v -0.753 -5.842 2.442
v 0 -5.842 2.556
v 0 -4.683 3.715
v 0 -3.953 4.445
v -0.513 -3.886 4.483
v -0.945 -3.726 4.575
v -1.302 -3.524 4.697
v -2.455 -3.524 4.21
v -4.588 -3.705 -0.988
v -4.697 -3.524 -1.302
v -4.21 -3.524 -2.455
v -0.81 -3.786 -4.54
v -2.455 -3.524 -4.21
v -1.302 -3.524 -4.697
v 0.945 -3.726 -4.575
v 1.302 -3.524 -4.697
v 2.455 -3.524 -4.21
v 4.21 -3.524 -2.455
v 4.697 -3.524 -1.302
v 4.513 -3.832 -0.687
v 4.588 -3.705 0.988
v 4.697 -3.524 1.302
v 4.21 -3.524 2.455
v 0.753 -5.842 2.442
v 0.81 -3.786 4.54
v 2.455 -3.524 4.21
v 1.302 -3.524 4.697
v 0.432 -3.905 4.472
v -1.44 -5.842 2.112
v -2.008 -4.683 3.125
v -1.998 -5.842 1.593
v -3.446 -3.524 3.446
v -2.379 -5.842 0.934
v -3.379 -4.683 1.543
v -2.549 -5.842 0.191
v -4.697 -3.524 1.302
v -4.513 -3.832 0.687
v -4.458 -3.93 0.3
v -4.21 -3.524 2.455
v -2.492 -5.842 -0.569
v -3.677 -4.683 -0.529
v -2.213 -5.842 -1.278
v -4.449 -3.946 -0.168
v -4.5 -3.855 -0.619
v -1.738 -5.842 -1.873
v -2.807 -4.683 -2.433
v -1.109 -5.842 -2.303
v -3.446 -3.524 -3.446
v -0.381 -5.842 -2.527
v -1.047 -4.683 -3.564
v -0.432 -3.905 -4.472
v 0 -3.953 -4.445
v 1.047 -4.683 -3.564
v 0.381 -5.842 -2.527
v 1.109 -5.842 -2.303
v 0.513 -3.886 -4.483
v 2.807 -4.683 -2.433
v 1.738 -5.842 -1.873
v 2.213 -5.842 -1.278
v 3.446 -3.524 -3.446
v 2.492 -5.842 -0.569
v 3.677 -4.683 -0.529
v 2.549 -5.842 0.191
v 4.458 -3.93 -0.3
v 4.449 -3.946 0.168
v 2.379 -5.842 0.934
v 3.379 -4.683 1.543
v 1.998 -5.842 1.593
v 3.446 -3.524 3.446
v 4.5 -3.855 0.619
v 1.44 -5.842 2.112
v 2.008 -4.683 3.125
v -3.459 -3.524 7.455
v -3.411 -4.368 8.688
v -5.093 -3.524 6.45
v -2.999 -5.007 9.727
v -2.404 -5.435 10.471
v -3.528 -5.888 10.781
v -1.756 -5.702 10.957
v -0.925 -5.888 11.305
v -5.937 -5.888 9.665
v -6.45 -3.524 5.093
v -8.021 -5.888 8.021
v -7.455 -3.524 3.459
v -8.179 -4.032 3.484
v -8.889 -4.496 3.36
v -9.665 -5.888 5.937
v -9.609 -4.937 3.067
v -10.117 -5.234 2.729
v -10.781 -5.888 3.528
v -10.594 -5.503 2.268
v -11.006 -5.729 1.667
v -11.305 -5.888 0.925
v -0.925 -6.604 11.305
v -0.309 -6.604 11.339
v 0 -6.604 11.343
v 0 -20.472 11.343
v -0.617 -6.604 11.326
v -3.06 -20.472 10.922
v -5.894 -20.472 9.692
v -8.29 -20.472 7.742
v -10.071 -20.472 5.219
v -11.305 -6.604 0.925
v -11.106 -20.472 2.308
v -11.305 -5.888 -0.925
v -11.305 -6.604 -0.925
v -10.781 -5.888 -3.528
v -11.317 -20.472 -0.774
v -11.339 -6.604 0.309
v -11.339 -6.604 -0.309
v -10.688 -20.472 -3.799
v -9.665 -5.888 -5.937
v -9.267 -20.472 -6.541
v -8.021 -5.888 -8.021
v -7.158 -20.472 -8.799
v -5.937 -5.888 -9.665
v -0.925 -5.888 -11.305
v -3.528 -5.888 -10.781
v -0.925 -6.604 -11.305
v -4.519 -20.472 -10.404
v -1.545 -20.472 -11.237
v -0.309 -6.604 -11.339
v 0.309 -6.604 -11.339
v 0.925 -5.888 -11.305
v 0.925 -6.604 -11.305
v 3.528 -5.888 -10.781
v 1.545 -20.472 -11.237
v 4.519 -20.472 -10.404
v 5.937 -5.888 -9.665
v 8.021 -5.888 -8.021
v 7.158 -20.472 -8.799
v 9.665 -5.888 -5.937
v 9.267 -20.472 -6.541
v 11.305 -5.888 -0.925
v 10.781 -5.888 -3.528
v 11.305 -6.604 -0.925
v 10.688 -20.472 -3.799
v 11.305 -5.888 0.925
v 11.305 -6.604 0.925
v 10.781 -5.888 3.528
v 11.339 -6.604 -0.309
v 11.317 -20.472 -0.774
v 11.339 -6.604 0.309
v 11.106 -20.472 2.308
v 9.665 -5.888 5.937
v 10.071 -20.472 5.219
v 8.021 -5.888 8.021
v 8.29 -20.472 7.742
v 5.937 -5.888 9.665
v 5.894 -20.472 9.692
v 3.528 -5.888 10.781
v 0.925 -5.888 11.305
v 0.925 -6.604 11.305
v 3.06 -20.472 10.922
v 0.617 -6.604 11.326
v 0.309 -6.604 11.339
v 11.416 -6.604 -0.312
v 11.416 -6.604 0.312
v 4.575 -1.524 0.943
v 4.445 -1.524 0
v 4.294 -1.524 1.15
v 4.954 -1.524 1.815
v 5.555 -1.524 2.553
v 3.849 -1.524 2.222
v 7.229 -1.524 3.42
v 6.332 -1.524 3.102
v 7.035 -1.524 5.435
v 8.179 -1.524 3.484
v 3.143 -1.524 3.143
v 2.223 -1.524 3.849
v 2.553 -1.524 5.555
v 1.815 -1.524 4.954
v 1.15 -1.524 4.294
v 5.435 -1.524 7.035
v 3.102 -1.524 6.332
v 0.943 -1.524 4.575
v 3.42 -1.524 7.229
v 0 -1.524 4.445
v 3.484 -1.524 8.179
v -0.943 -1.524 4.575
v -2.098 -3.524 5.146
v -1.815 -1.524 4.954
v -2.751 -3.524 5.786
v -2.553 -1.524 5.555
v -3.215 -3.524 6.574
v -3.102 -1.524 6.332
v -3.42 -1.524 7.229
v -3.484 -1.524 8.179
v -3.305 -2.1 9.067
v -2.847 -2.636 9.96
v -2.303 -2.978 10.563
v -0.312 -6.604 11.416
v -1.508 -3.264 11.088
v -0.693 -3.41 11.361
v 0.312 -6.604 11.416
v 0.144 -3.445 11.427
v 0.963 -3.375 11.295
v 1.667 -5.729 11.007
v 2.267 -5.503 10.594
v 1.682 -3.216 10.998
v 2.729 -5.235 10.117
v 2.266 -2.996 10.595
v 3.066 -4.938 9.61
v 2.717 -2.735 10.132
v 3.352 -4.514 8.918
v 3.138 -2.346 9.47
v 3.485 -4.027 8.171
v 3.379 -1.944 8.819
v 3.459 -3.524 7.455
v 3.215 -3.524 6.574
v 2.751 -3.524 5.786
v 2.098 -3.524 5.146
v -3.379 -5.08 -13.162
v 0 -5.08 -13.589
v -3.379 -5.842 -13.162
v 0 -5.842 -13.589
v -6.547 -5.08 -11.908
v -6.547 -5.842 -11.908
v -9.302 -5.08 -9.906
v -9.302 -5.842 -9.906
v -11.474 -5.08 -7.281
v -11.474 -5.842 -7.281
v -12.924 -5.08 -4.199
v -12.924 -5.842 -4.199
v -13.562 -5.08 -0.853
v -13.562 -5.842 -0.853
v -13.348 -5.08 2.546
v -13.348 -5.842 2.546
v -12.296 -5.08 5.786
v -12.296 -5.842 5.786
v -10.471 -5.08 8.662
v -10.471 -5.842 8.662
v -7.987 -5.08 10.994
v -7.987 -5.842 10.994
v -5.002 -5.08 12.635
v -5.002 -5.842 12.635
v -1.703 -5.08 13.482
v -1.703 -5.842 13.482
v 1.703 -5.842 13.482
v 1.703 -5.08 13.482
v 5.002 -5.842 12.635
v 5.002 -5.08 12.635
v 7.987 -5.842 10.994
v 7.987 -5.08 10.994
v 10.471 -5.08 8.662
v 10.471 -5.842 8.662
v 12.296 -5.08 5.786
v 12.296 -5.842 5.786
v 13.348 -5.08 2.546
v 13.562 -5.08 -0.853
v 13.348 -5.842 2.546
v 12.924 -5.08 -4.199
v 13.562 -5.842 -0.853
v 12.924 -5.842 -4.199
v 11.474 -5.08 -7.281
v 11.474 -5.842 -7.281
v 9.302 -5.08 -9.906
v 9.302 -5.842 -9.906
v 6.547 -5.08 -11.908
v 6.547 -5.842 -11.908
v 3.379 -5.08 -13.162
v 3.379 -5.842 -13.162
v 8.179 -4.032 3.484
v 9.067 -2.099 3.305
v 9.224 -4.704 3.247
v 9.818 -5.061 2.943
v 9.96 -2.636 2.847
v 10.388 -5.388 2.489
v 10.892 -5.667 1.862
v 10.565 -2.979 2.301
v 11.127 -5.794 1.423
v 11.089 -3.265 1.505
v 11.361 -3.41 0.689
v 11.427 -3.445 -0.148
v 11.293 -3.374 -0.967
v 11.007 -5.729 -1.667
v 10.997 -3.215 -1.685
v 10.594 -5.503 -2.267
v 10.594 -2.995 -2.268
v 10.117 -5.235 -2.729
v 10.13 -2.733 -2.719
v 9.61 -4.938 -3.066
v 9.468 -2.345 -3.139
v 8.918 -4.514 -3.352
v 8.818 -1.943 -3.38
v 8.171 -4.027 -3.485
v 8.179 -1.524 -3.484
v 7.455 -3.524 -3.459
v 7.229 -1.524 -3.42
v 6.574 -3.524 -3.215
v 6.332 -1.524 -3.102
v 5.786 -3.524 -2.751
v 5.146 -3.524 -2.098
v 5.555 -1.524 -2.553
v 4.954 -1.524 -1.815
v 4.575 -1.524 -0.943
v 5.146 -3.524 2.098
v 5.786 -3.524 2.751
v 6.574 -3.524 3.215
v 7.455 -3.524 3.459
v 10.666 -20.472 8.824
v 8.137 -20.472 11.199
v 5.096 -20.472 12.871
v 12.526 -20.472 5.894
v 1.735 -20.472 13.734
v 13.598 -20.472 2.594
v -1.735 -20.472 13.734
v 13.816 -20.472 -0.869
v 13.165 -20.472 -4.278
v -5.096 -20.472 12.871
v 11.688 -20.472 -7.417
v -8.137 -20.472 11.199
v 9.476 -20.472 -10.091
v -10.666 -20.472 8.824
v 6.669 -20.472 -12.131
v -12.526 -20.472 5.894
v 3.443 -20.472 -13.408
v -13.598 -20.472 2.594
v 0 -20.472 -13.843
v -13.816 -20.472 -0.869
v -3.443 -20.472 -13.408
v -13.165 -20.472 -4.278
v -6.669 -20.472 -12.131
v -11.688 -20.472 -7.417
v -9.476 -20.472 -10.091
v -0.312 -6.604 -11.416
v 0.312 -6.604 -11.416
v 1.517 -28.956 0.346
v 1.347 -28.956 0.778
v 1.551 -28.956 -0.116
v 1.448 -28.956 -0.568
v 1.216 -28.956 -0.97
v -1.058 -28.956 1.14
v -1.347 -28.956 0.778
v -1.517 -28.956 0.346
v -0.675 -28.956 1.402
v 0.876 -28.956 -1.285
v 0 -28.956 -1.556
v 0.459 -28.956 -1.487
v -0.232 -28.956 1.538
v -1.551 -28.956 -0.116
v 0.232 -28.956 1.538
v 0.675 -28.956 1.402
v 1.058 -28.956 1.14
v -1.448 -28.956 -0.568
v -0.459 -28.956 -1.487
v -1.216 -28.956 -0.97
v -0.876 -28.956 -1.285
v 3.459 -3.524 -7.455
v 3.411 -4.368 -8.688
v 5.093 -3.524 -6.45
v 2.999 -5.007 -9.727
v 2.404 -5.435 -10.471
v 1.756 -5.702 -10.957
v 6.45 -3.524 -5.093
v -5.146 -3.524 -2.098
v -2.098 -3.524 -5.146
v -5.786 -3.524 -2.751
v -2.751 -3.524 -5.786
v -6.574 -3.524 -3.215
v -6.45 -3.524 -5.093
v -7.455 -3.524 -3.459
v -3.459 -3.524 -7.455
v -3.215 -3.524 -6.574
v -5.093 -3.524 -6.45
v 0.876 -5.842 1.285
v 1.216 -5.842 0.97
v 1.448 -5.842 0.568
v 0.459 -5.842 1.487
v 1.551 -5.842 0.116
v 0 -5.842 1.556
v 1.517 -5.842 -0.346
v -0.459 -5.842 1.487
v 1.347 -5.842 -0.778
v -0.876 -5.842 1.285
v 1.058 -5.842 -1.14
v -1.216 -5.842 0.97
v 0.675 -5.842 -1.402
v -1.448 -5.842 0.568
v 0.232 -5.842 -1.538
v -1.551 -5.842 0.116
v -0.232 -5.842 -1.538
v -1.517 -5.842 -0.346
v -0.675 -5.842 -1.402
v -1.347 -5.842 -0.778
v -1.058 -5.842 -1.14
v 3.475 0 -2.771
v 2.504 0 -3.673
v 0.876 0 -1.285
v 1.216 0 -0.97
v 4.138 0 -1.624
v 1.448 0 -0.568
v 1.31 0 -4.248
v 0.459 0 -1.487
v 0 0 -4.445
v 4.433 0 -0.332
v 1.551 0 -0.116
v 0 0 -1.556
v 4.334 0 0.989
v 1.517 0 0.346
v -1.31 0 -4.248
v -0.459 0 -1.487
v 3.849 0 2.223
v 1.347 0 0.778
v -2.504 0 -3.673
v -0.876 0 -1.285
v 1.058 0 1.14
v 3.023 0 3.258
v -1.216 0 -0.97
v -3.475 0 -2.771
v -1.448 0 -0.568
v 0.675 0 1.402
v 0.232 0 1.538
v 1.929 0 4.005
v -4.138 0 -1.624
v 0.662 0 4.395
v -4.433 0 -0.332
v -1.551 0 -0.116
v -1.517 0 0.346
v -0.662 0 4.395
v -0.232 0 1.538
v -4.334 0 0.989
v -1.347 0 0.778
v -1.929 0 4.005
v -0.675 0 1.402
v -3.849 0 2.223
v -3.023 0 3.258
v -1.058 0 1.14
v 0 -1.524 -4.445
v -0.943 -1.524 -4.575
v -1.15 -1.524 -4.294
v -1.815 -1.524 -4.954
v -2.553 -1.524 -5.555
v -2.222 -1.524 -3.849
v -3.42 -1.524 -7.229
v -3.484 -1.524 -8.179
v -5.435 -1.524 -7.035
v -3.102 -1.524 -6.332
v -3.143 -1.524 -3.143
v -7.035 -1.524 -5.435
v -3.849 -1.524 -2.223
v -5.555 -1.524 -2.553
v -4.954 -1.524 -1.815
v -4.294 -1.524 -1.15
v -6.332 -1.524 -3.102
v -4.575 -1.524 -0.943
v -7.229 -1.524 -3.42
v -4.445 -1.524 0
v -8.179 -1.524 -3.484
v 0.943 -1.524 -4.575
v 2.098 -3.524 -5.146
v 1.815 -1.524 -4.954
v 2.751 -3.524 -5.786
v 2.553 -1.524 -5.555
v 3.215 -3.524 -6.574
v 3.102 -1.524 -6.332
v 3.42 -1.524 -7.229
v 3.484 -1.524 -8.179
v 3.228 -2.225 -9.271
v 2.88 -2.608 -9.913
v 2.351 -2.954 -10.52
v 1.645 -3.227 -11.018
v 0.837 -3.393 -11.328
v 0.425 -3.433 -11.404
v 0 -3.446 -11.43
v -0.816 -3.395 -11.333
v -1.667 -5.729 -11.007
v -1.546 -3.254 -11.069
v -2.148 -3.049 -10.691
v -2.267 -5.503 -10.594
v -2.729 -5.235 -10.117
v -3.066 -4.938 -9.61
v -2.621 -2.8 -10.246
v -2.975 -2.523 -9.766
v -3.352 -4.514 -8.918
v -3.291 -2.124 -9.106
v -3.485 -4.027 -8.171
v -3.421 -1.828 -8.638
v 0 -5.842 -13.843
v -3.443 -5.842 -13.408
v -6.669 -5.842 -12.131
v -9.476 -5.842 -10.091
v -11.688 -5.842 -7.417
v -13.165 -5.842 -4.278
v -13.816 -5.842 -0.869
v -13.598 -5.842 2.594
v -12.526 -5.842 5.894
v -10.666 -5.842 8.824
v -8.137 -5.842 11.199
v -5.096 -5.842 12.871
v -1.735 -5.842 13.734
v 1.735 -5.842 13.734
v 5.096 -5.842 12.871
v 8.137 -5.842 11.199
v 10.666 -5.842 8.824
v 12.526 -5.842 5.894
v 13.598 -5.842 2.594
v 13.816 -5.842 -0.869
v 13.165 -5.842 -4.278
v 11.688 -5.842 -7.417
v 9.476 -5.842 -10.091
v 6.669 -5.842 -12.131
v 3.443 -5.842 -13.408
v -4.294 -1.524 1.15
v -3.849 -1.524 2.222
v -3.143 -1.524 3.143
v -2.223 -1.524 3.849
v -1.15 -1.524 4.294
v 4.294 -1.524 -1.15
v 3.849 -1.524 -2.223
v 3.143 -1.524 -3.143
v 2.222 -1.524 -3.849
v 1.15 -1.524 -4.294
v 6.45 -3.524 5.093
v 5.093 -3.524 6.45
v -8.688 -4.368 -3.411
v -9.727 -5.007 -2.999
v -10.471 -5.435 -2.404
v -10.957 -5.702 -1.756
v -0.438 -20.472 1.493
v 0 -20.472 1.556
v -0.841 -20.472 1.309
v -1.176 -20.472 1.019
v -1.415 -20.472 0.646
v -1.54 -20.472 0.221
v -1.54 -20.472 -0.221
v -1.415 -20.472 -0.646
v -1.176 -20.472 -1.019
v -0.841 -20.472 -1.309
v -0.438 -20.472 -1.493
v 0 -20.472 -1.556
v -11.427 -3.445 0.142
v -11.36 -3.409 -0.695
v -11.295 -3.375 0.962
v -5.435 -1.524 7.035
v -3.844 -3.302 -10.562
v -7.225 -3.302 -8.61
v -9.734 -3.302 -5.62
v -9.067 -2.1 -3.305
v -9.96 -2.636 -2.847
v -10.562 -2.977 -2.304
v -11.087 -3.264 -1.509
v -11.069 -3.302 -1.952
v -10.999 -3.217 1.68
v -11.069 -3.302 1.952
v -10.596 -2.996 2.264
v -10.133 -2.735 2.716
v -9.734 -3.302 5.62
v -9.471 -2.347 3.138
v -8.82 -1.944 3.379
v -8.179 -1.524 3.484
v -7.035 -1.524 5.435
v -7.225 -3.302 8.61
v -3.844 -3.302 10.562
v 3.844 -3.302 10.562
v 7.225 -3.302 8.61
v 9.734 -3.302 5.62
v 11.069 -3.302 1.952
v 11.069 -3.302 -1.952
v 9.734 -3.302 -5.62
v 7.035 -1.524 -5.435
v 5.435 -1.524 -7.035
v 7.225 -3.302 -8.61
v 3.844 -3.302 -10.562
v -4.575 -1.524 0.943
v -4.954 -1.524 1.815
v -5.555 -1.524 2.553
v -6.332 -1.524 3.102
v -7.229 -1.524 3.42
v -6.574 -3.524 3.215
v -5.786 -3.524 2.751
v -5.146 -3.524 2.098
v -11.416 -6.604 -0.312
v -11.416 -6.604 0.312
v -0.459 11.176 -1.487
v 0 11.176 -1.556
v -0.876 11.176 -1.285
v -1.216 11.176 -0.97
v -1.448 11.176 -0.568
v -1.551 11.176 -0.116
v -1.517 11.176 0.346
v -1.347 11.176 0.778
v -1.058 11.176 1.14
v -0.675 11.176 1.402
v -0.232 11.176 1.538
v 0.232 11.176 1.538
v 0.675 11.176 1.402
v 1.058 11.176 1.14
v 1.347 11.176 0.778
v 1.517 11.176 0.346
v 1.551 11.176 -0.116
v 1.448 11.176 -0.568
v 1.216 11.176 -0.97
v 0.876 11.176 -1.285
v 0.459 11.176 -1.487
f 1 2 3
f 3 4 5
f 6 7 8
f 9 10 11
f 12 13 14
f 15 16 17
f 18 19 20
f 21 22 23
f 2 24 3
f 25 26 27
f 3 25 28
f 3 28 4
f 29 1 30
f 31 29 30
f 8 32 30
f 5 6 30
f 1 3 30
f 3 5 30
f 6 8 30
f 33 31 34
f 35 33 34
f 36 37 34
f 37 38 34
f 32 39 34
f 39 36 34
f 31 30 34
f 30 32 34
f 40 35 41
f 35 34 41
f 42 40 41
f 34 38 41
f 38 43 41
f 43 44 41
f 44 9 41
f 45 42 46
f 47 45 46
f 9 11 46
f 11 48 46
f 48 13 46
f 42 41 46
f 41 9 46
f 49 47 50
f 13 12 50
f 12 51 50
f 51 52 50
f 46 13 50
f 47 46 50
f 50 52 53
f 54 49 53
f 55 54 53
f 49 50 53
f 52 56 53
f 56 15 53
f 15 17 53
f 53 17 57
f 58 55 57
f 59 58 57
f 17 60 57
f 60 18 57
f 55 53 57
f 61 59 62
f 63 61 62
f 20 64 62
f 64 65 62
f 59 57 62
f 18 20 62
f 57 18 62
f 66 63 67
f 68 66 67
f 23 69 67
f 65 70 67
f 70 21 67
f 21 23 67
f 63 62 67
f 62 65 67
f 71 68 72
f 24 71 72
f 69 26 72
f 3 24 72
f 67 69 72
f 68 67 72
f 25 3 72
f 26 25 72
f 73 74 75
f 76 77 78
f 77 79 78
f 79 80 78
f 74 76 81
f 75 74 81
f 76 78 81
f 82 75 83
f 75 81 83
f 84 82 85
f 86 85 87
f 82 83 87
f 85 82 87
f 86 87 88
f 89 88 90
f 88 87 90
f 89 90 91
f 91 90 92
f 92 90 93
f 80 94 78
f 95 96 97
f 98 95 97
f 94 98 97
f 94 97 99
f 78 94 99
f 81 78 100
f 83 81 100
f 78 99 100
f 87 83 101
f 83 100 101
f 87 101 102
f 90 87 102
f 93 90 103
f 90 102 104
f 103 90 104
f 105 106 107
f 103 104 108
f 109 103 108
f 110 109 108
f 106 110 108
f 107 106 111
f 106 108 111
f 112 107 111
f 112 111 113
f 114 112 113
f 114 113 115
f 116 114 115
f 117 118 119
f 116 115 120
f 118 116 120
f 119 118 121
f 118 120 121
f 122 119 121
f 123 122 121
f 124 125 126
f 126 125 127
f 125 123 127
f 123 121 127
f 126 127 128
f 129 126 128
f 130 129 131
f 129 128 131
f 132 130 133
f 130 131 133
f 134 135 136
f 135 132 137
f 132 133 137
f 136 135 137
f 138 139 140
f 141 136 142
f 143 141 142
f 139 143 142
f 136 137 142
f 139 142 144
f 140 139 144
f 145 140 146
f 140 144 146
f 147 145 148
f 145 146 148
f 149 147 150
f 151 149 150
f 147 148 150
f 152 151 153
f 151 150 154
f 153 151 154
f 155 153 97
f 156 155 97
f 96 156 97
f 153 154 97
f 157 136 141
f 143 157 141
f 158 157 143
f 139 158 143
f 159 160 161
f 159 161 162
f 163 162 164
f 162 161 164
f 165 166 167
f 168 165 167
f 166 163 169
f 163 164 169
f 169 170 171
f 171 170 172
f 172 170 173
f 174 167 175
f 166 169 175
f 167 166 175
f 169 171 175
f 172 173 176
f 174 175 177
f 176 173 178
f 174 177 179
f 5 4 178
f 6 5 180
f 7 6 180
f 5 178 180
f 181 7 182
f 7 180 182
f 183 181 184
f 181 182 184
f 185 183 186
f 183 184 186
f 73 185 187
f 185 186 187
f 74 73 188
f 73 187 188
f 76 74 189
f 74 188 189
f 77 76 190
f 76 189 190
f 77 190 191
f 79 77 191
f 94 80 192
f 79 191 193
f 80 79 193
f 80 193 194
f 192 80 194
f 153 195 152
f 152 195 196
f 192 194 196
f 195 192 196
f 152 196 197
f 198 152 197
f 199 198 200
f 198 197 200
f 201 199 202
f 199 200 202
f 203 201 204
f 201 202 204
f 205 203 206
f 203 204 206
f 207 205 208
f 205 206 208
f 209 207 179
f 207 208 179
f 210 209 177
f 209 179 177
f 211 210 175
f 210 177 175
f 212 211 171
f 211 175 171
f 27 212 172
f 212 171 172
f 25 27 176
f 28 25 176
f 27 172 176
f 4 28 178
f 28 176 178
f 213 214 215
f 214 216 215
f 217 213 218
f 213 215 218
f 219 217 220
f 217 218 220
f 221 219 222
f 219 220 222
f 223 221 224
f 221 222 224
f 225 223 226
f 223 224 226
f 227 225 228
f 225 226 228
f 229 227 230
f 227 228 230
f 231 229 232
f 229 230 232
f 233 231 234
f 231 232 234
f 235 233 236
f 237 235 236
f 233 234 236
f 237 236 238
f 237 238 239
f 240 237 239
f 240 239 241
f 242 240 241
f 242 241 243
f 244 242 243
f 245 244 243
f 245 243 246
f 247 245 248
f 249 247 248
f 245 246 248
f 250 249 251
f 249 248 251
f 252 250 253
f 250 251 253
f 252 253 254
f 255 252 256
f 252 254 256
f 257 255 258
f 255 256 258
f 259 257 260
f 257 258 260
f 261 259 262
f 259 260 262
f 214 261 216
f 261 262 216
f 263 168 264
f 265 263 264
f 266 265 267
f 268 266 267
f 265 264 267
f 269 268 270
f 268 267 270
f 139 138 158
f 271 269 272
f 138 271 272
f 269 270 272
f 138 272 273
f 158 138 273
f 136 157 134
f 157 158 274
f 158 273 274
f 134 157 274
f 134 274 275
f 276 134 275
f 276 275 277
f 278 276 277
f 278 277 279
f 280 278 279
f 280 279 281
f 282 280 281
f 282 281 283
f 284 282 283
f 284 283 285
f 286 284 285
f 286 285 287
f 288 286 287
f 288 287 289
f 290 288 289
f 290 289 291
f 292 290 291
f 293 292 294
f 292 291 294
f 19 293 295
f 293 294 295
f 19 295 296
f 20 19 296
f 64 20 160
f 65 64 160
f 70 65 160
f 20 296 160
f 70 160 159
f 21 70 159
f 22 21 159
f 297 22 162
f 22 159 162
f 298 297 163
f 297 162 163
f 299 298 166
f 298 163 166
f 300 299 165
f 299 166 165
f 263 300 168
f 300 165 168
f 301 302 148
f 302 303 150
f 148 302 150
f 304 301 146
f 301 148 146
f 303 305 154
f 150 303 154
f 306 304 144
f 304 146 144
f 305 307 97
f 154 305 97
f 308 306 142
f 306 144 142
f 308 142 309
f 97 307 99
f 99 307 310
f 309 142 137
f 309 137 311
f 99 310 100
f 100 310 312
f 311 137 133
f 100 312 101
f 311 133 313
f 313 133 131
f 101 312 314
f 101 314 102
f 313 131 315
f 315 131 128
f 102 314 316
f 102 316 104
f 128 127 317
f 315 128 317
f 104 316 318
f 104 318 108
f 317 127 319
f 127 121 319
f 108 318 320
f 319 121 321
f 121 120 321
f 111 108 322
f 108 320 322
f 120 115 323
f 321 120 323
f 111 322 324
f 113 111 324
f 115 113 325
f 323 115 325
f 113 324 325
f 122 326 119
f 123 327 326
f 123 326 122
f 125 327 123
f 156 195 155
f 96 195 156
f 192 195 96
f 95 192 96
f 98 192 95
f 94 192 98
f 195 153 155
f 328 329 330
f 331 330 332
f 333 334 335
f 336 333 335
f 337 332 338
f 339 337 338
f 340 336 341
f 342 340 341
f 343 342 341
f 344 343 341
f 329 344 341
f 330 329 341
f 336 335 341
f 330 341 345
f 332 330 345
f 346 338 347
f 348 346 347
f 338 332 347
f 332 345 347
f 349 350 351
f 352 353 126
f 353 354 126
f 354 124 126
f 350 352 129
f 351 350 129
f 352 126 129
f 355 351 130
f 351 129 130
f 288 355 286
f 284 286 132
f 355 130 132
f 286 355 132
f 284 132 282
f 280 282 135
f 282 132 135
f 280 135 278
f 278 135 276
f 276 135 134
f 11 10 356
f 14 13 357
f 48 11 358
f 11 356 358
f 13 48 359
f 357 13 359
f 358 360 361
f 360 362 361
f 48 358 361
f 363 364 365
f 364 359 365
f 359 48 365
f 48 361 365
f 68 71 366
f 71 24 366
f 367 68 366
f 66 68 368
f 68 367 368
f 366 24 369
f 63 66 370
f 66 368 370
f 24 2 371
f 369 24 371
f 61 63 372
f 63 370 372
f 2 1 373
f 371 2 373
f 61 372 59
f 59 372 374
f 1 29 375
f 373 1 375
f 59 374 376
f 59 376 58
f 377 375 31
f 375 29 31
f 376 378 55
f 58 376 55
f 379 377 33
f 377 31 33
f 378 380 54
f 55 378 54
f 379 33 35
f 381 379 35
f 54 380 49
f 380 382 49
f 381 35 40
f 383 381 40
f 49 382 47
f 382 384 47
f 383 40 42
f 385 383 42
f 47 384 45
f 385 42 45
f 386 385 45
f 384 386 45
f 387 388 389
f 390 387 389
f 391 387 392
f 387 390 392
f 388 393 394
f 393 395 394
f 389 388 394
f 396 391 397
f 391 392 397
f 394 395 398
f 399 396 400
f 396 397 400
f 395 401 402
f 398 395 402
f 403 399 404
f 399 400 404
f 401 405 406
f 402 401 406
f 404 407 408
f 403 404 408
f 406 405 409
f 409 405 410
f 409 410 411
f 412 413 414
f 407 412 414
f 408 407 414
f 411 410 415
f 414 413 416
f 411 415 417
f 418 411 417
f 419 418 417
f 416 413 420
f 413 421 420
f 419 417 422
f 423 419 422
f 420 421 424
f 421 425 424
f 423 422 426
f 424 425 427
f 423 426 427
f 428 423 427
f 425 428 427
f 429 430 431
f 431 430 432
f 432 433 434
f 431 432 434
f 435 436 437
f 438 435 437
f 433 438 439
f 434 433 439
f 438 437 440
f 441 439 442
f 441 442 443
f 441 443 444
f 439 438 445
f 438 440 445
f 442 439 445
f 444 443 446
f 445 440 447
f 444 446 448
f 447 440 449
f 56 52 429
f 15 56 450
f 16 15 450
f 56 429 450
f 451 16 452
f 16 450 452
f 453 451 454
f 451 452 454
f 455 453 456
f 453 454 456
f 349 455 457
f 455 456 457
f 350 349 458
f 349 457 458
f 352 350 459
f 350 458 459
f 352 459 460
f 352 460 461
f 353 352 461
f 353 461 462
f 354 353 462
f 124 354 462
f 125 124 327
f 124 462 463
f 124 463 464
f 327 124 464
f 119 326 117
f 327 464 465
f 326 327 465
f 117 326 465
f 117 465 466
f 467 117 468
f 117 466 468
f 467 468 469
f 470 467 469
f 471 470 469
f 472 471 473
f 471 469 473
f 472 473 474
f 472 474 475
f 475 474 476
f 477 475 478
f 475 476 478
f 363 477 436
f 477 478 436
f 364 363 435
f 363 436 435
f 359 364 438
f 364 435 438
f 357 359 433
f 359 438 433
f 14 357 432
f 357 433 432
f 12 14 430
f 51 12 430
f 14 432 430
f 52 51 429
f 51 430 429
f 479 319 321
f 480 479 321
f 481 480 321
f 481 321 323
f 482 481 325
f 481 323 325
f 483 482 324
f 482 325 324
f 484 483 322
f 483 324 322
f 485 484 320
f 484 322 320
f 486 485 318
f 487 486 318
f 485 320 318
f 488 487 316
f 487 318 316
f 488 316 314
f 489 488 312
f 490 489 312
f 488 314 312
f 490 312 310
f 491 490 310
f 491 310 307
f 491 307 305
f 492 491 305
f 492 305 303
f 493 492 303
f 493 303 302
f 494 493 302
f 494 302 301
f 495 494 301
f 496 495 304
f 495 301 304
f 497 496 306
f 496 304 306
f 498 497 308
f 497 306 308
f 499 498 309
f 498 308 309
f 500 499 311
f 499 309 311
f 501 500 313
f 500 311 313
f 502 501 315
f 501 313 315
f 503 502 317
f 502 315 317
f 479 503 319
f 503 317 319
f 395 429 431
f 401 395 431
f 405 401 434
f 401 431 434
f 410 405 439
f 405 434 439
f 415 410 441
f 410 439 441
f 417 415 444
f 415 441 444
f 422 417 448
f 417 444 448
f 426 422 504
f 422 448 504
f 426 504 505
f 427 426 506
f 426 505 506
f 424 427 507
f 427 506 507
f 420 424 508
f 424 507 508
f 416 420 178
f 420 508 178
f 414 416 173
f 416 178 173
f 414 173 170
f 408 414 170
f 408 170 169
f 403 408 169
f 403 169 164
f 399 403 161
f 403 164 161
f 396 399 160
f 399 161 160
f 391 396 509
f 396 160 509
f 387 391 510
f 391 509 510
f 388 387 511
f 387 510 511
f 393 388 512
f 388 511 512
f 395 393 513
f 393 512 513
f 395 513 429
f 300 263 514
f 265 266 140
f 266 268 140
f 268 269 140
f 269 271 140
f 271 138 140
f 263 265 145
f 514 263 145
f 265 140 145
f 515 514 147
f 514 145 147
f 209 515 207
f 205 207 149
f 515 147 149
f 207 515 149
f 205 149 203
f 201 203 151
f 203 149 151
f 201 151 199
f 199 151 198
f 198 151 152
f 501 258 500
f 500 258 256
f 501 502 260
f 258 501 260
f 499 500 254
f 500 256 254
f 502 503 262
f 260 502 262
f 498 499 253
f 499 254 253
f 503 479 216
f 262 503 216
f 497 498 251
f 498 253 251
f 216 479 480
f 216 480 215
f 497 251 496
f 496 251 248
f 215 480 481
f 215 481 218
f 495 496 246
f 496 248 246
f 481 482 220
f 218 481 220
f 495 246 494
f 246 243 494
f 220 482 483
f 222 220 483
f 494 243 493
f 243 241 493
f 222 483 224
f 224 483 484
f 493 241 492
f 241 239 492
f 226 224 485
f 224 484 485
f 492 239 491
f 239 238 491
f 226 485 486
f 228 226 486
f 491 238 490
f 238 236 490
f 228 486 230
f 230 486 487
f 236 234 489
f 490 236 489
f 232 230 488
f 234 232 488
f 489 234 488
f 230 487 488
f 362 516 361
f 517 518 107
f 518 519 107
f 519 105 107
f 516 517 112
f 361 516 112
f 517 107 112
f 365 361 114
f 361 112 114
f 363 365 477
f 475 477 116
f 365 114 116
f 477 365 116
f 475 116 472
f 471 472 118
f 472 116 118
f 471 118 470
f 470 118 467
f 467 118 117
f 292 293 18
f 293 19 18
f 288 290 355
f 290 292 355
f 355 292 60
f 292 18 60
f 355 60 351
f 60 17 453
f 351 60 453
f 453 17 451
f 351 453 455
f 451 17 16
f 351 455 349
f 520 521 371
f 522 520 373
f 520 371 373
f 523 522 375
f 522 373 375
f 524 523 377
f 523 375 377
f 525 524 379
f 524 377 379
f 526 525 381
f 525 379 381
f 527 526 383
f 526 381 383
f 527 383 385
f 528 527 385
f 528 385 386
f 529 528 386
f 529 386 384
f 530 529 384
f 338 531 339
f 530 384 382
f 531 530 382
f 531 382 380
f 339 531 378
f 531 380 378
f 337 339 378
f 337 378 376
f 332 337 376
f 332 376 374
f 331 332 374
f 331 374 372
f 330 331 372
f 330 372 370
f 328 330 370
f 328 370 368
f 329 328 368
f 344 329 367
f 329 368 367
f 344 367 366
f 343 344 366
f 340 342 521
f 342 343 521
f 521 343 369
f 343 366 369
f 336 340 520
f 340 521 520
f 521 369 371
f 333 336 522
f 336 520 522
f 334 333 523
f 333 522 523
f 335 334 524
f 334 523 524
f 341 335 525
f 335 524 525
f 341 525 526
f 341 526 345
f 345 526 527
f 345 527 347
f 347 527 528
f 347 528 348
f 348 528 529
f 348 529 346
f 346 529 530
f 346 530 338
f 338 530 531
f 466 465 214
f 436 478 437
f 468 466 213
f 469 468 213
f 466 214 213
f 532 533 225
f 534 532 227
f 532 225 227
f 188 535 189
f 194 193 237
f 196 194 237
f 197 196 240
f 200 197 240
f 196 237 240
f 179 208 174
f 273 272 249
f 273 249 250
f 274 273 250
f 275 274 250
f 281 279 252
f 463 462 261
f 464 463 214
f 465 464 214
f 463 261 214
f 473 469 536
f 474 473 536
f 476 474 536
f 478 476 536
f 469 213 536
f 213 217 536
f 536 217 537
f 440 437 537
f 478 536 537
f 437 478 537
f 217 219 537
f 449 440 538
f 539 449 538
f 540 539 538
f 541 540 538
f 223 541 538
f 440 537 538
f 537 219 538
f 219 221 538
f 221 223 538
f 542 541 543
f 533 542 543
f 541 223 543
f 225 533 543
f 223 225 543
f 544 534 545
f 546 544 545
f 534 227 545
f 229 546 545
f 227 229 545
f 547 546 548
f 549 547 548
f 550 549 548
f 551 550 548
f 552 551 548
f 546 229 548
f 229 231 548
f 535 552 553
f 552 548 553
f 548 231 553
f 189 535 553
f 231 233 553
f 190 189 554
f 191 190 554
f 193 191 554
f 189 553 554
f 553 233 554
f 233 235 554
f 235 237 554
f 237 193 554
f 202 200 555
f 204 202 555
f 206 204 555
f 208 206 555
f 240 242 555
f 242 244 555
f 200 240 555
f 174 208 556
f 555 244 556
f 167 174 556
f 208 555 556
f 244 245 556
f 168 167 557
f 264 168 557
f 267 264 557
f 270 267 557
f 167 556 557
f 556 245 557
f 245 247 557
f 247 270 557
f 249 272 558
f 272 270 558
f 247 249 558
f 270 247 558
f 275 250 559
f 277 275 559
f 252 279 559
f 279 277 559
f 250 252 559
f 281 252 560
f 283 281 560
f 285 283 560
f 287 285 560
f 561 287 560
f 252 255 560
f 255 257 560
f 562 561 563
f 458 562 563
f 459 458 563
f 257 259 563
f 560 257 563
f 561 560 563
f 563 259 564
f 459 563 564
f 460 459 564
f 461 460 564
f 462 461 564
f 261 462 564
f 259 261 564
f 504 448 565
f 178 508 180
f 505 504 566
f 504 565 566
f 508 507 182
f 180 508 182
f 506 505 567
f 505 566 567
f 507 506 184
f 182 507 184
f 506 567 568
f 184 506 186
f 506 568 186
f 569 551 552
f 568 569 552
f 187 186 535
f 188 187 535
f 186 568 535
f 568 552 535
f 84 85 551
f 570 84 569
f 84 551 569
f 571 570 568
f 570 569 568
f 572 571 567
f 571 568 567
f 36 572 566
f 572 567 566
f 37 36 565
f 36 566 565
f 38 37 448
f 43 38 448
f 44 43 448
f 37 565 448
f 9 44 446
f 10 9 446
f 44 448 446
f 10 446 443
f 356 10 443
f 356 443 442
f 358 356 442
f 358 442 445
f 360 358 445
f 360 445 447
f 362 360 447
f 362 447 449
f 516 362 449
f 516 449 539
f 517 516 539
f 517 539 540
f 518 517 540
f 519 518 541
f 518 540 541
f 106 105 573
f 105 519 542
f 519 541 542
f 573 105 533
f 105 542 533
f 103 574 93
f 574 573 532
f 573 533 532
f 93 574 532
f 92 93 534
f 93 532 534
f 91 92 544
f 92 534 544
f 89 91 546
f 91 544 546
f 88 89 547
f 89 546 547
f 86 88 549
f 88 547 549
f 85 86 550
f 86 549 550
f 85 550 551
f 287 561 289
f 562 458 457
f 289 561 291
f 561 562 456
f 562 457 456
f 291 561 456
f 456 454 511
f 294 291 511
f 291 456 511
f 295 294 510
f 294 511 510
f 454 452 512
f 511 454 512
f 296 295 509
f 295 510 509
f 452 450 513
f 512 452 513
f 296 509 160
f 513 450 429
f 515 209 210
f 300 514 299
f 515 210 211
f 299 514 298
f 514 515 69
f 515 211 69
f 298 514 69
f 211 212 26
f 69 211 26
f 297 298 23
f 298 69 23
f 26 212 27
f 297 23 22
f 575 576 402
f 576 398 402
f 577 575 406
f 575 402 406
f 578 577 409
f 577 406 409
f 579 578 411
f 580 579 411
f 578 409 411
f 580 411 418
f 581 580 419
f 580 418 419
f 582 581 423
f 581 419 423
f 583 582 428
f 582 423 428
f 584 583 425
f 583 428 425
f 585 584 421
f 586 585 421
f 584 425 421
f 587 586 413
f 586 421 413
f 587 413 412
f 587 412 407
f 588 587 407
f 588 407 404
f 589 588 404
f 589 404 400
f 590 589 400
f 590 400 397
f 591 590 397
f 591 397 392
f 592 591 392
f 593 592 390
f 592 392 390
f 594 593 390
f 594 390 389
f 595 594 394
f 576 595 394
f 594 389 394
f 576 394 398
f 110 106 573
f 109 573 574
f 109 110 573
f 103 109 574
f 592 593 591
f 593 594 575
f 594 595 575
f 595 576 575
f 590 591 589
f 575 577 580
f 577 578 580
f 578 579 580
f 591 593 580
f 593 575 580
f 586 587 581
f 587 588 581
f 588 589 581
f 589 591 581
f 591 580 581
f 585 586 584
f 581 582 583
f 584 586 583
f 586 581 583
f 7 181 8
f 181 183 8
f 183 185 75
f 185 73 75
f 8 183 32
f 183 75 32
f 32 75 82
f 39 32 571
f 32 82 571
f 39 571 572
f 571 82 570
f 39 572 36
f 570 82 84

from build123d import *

# Parameters (mm, degrees)
SKETCH3_R          = 13.843
SKETCH3_R_2        = 1.55575
CUT_EXTRUDE2_DEPTH = 38.213955992
SKETCH2_R          = 3.4925
CUT_EXTRUDE1_DEPTH = 5.08


with BuildPart() as part:
    # Sketch1 → Revolve1 (revolve)
    with BuildSketch(Plane.XY, mode=Mode.PRIVATE) as revolve1_sk:
        Polygon((0, 11.176), (1.55575, 11.176), (1.55575, 0), (4.445, 0), (4.445, -1.524), (8.89, -1.524), (13.589, -5.08), (13.589, -5.842), (13.843, -5.842), (13.843, -20.4724), (13.589, -20.4724), (13.589, -23.0124), (12.7, -26.67), (3.81, -26.67), (3.81, -26.924), (1.55575, -26.924), (1.55575, -28.956), (0, -28.956), align=None)
    revolve(revolve1_sk.sketch.rotate(Axis((0, -28.956, 0), (0, 1, 0)), 90), axis=Axis((0, -28.956, 0), (0, 1, 0)))

    # Sketch3 → Cut-Extrude2 (cut, through all)
    with BuildSketch(Plane.XZ.offset(20.4724)):
        with Locations(Location((0, 0, 0), (0, 0, 270))):
            Circle(SKETCH3_R)
        with Locations(Location((0, 0, 0), (0, 0, 270))):
            Circle(SKETCH3_R_2, mode=Mode.SUBTRACT)
    extrude(amount=CUT_EXTRUDE2_DEPTH, mode=Mode.SUBTRACT)

    # Sketch5 → Cut-Revolve1 (revolve, cut)
    with BuildSketch(Plane.XY, mode=Mode.PRIVATE) as cut_revolve1_sk:
        Polygon((11.343, -5.888455731), (11.343, -24.765583443), (1.55575, -24.765583443), (1.55575, -5.842), (2.55575, -5.842), (4.87375, -3.524), (8.218540641, -3.524), align=None)
    revolve(cut_revolve1_sk.sketch.rotate(Axis((0, 11.176, 0), (0, -1, 0)), 90), axis=Axis((0, 11.176, 0), (0, -1, 0)), mode=Mode.SUBTRACT)

    # Sketch2 → Cut-Extrude1 (cut)
    with BuildSketch(Plane(origin=(0, -1.524, 0), x_dir=(1, 0, 0), z_dir=(0, 1, 0))):
        with Locations(Location((0, 7.9375, 0), (0, 0, 270))):
            Circle(SKETCH2_R)
        with Locations(Location((7.9375, 0, 0), (0, 0, 273.961773505))):
            Circle(SKETCH2_R)
        with Locations(Location((0, -7.9375, 0), (0, 0, 90))):
            Circle(SKETCH2_R)
        with Locations(Location((-7.9375, 0, 0), (0, 0, 266.038226276))):
            Circle(SKETCH2_R)
    extrude(amount=-CUT_EXTRUDE1_DEPTH, mode=Mode.SUBTRACT)


solid = part.part
